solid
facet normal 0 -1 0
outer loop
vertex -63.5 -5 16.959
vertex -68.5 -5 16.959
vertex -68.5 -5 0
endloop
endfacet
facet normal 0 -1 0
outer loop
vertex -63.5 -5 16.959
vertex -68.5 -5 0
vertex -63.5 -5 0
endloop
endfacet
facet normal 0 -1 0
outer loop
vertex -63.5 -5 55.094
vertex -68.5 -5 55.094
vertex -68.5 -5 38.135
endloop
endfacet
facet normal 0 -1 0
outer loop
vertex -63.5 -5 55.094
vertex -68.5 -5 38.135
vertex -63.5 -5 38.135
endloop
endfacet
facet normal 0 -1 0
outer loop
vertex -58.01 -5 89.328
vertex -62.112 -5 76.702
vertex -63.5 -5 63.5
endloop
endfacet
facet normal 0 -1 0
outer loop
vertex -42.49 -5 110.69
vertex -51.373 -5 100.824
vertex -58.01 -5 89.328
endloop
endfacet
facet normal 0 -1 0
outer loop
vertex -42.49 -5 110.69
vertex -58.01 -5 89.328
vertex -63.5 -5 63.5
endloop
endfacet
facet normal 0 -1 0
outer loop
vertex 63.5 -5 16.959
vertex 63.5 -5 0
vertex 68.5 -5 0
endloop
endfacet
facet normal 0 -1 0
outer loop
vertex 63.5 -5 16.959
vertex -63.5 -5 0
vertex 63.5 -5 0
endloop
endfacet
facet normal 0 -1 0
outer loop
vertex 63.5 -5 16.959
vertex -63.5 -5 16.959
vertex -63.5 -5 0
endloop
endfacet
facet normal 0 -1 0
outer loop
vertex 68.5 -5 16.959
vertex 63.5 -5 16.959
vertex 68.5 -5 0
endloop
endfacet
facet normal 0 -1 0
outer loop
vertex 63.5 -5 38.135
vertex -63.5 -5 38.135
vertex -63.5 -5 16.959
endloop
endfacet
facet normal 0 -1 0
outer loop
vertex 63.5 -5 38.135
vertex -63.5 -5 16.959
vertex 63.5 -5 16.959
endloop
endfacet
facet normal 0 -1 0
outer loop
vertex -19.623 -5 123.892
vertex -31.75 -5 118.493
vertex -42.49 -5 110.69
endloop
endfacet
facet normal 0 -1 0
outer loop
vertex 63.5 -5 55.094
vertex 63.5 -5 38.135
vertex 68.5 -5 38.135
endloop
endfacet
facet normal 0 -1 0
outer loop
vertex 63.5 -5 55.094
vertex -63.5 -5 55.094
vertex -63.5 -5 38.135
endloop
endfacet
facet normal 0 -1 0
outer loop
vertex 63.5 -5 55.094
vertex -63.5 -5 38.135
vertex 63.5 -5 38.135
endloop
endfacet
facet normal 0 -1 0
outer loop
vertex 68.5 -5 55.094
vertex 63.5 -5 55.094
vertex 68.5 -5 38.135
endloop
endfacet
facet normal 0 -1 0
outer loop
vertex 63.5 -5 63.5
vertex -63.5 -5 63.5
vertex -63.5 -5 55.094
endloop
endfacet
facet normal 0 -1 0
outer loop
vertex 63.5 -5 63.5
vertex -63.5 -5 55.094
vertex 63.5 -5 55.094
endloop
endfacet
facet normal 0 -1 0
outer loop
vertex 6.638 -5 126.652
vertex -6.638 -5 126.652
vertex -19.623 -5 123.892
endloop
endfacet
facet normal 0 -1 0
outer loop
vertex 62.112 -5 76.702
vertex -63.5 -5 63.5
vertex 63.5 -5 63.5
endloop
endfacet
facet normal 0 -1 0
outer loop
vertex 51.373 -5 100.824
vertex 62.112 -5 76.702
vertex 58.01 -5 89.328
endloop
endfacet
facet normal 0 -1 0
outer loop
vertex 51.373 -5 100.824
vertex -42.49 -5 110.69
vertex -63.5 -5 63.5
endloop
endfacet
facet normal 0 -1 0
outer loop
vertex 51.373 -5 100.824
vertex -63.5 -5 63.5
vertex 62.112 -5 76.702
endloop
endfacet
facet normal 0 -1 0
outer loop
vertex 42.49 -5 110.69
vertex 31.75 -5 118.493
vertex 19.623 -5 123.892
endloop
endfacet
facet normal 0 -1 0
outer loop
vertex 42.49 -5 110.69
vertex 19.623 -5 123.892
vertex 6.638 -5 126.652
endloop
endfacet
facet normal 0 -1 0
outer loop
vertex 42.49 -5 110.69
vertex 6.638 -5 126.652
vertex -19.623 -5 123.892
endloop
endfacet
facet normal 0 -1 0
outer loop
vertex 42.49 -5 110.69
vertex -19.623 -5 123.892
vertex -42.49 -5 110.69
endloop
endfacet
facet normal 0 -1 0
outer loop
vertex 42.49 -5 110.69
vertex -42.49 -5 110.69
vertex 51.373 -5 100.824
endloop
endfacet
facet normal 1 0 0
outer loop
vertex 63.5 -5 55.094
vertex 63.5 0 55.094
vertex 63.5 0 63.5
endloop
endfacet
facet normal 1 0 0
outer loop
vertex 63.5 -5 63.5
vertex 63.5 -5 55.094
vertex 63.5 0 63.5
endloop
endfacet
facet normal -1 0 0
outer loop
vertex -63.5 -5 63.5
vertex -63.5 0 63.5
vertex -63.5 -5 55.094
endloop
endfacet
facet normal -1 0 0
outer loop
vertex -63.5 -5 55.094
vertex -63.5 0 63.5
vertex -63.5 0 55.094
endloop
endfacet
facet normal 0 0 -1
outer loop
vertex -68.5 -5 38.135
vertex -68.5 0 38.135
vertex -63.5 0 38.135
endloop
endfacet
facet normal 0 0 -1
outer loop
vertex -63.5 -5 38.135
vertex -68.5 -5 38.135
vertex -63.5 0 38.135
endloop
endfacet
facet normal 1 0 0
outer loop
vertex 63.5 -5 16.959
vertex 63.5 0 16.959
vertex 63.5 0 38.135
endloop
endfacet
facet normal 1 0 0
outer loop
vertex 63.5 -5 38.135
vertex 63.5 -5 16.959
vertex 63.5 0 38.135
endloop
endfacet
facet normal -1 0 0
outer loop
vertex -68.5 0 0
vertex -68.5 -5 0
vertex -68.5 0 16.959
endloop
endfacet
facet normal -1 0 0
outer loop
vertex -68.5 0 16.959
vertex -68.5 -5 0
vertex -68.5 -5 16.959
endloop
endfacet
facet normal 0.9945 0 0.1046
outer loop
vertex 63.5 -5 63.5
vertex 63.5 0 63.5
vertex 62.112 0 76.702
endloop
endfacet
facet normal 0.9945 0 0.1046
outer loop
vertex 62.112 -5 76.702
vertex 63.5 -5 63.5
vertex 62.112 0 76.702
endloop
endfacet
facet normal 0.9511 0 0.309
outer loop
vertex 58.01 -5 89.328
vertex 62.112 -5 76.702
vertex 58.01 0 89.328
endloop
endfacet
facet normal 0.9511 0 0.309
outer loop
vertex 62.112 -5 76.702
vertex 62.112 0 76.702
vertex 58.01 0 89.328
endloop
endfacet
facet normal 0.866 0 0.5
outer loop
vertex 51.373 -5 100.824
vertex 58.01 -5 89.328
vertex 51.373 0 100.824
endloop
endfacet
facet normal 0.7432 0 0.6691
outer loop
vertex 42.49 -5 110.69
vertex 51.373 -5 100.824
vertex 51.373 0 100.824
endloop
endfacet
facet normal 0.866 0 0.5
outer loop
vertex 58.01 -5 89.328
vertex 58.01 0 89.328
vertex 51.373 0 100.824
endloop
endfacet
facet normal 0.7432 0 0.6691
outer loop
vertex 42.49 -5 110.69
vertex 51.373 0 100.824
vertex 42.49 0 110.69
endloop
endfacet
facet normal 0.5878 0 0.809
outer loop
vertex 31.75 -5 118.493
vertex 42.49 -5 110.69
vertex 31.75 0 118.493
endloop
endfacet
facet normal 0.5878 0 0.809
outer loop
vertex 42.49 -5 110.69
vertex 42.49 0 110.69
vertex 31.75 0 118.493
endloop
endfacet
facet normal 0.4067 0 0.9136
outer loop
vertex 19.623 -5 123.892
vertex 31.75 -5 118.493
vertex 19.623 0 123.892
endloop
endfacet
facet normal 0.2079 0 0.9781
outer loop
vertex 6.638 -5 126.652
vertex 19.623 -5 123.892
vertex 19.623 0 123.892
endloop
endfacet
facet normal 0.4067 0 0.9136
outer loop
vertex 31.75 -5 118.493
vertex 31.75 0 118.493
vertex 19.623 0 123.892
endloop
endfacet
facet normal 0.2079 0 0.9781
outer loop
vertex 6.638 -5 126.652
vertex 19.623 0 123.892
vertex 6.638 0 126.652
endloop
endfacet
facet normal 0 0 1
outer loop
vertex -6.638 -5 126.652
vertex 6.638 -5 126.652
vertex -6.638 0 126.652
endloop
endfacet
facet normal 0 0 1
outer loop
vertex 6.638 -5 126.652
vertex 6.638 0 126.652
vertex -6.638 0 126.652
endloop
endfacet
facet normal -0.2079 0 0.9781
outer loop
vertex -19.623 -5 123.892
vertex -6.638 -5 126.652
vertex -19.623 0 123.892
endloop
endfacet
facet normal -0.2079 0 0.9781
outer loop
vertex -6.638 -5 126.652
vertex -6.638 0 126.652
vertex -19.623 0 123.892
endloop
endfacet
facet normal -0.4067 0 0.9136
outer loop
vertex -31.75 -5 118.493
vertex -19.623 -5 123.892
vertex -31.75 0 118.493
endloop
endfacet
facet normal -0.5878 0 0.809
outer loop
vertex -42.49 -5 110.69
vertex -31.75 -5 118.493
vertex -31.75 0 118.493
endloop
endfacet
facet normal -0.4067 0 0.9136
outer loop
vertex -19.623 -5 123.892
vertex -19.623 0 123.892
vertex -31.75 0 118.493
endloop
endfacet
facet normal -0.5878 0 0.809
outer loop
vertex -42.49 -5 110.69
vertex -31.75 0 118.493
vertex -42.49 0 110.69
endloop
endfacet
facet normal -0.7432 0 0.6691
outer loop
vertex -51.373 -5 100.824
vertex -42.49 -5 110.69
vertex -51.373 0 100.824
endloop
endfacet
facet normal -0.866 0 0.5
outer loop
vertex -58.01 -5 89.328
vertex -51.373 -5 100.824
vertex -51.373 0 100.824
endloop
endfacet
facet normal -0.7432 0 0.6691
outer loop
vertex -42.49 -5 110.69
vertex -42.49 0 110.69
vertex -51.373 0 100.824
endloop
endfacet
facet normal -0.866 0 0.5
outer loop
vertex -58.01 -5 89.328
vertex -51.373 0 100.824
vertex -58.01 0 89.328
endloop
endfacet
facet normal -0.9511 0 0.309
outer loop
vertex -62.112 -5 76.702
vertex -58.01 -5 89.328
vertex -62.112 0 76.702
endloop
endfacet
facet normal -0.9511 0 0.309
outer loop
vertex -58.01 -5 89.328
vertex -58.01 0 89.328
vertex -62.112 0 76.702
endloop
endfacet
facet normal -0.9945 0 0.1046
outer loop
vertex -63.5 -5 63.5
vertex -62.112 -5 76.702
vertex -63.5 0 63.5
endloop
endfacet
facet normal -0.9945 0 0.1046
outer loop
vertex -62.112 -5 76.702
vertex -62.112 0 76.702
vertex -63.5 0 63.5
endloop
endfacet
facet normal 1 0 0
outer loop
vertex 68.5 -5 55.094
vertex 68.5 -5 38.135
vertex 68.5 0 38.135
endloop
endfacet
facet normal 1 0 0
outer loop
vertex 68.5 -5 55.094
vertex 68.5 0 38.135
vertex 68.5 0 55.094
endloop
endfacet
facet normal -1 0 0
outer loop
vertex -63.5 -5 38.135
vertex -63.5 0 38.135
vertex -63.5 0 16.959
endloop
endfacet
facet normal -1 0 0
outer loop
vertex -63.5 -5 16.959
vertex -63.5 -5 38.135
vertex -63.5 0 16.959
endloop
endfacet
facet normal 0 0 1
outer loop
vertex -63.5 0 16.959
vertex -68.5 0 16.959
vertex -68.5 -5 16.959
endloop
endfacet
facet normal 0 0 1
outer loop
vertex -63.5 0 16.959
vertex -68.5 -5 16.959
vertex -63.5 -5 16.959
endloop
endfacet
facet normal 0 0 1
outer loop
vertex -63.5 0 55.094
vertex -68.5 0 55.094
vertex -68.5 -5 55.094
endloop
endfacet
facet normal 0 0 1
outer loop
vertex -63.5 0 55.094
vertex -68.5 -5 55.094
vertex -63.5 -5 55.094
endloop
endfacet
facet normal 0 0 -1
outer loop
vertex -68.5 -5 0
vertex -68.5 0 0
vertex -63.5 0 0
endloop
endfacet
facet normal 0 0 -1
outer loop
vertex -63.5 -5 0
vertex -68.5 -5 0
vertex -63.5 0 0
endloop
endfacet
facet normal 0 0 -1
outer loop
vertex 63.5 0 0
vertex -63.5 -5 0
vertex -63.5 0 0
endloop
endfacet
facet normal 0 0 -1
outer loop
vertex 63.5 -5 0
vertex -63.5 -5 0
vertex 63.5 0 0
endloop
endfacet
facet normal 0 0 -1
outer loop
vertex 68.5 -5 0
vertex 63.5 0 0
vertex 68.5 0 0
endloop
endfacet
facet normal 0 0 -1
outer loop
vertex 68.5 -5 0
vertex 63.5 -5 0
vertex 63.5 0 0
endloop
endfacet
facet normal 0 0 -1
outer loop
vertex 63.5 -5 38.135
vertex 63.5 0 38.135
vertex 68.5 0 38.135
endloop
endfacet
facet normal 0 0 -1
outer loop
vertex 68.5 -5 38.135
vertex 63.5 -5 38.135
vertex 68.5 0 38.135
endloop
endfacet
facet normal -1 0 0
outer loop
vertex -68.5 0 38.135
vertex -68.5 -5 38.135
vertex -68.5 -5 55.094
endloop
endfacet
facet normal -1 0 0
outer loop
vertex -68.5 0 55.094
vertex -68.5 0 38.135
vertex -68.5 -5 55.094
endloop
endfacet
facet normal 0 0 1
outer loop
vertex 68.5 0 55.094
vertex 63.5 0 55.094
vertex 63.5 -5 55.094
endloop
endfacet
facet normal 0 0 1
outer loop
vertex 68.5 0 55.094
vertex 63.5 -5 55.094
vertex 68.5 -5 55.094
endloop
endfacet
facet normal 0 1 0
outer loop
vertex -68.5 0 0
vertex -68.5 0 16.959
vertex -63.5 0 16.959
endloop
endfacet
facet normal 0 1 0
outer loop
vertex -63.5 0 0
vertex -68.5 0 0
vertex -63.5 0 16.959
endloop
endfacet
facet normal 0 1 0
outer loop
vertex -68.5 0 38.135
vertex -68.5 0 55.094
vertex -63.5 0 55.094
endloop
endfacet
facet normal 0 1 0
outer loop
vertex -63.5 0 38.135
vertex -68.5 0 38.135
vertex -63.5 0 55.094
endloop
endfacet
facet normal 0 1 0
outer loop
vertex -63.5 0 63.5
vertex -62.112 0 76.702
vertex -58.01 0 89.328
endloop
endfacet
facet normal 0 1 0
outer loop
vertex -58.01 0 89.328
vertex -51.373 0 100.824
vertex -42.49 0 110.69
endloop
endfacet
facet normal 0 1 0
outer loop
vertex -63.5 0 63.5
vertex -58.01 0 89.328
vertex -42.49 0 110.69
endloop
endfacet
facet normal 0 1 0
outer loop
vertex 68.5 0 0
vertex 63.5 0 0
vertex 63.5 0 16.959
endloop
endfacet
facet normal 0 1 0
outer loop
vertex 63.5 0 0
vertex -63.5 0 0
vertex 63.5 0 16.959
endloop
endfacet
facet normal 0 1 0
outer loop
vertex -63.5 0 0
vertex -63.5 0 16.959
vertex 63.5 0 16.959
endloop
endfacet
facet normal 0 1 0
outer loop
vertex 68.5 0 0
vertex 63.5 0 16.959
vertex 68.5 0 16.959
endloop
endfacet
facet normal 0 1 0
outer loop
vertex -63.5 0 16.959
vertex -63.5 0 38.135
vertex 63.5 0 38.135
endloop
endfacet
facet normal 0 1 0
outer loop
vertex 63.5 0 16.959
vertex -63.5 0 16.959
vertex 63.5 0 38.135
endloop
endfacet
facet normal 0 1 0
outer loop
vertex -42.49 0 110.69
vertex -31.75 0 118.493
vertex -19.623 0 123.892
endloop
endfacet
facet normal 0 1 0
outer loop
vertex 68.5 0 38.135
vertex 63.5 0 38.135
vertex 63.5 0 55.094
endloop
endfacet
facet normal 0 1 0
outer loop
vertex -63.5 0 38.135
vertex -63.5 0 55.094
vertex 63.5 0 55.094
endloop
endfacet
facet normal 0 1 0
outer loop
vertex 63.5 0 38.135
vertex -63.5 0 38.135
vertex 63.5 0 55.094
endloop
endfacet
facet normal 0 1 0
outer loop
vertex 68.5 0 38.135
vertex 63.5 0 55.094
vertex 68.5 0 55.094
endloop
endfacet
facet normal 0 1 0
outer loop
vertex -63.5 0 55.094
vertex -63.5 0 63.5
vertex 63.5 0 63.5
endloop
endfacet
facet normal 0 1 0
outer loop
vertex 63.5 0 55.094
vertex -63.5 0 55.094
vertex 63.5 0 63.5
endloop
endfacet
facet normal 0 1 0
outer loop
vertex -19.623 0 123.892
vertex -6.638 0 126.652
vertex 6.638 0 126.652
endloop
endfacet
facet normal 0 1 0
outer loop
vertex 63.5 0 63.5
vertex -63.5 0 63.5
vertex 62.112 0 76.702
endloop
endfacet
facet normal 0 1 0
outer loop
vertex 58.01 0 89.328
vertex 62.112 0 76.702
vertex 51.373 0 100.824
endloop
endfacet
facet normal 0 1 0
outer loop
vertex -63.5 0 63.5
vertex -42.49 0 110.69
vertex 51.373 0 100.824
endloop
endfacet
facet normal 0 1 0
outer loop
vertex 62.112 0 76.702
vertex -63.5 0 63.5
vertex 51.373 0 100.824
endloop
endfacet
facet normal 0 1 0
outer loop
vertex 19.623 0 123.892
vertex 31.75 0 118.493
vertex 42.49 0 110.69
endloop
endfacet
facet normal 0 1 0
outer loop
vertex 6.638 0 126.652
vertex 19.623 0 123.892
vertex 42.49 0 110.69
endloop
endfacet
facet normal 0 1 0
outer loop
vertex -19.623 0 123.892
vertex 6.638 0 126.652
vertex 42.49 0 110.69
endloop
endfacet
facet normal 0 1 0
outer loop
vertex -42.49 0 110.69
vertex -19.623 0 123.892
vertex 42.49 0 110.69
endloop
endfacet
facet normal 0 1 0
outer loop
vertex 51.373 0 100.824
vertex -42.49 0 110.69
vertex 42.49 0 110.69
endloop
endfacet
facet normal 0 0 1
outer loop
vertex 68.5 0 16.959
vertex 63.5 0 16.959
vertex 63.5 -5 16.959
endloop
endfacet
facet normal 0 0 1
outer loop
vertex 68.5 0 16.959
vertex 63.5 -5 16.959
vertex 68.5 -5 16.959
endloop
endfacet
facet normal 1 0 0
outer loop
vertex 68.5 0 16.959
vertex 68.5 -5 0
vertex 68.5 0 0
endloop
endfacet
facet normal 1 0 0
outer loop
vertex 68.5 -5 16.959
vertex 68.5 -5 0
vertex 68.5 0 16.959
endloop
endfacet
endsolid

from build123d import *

# Parameters (mm, degrees)
BOSS_EXTRUDE1_DEPTH = 4.999999906
SKETCH3_W           = 4.999999906
SKETCH3_H           = 16.959219297
BOSS_EXTRUDE2_DEPTH = 4.999999906


with BuildPart() as part:
    # Sketch2 → Boss-Extrude1 (new body)
    with BuildSketch(Plane.XZ):
        with BuildLine():
            Line((-63.5, 63.5), (-63.5, 0))
            Line((-63.5, 0), (63.5, 0))
            Line((63.5, 0), (63.5, 63.5))
            ThreePointArc((63.5, 63.5), (0, 127), (-63.5, 63.5))
        make_face()
    extrude(amount=BOSS_EXTRUDE1_DEPTH)

    # Sketch3 → Boss-Extrude2 (add)
    with BuildSketch(Plane.XZ.offset(4.999999906)):
        with Locations((65.999999953, 8.479609649)):
            Rectangle(SKETCH3_W, SKETCH3_H)
        with Locations((65.999999953, 46.614250443)):
            Rectangle(SKETCH3_W, SKETCH3_H)
        with Locations((-65.999999953, 46.614250443)):
            Rectangle(SKETCH3_W, SKETCH3_H)
        with Locations((-65.999999953, 8.479609649)):
            Rectangle(SKETCH3_W, SKETCH3_H)
    extrude(amount=-BOSS_EXTRUDE2_DEPTH)


solid = part.part
